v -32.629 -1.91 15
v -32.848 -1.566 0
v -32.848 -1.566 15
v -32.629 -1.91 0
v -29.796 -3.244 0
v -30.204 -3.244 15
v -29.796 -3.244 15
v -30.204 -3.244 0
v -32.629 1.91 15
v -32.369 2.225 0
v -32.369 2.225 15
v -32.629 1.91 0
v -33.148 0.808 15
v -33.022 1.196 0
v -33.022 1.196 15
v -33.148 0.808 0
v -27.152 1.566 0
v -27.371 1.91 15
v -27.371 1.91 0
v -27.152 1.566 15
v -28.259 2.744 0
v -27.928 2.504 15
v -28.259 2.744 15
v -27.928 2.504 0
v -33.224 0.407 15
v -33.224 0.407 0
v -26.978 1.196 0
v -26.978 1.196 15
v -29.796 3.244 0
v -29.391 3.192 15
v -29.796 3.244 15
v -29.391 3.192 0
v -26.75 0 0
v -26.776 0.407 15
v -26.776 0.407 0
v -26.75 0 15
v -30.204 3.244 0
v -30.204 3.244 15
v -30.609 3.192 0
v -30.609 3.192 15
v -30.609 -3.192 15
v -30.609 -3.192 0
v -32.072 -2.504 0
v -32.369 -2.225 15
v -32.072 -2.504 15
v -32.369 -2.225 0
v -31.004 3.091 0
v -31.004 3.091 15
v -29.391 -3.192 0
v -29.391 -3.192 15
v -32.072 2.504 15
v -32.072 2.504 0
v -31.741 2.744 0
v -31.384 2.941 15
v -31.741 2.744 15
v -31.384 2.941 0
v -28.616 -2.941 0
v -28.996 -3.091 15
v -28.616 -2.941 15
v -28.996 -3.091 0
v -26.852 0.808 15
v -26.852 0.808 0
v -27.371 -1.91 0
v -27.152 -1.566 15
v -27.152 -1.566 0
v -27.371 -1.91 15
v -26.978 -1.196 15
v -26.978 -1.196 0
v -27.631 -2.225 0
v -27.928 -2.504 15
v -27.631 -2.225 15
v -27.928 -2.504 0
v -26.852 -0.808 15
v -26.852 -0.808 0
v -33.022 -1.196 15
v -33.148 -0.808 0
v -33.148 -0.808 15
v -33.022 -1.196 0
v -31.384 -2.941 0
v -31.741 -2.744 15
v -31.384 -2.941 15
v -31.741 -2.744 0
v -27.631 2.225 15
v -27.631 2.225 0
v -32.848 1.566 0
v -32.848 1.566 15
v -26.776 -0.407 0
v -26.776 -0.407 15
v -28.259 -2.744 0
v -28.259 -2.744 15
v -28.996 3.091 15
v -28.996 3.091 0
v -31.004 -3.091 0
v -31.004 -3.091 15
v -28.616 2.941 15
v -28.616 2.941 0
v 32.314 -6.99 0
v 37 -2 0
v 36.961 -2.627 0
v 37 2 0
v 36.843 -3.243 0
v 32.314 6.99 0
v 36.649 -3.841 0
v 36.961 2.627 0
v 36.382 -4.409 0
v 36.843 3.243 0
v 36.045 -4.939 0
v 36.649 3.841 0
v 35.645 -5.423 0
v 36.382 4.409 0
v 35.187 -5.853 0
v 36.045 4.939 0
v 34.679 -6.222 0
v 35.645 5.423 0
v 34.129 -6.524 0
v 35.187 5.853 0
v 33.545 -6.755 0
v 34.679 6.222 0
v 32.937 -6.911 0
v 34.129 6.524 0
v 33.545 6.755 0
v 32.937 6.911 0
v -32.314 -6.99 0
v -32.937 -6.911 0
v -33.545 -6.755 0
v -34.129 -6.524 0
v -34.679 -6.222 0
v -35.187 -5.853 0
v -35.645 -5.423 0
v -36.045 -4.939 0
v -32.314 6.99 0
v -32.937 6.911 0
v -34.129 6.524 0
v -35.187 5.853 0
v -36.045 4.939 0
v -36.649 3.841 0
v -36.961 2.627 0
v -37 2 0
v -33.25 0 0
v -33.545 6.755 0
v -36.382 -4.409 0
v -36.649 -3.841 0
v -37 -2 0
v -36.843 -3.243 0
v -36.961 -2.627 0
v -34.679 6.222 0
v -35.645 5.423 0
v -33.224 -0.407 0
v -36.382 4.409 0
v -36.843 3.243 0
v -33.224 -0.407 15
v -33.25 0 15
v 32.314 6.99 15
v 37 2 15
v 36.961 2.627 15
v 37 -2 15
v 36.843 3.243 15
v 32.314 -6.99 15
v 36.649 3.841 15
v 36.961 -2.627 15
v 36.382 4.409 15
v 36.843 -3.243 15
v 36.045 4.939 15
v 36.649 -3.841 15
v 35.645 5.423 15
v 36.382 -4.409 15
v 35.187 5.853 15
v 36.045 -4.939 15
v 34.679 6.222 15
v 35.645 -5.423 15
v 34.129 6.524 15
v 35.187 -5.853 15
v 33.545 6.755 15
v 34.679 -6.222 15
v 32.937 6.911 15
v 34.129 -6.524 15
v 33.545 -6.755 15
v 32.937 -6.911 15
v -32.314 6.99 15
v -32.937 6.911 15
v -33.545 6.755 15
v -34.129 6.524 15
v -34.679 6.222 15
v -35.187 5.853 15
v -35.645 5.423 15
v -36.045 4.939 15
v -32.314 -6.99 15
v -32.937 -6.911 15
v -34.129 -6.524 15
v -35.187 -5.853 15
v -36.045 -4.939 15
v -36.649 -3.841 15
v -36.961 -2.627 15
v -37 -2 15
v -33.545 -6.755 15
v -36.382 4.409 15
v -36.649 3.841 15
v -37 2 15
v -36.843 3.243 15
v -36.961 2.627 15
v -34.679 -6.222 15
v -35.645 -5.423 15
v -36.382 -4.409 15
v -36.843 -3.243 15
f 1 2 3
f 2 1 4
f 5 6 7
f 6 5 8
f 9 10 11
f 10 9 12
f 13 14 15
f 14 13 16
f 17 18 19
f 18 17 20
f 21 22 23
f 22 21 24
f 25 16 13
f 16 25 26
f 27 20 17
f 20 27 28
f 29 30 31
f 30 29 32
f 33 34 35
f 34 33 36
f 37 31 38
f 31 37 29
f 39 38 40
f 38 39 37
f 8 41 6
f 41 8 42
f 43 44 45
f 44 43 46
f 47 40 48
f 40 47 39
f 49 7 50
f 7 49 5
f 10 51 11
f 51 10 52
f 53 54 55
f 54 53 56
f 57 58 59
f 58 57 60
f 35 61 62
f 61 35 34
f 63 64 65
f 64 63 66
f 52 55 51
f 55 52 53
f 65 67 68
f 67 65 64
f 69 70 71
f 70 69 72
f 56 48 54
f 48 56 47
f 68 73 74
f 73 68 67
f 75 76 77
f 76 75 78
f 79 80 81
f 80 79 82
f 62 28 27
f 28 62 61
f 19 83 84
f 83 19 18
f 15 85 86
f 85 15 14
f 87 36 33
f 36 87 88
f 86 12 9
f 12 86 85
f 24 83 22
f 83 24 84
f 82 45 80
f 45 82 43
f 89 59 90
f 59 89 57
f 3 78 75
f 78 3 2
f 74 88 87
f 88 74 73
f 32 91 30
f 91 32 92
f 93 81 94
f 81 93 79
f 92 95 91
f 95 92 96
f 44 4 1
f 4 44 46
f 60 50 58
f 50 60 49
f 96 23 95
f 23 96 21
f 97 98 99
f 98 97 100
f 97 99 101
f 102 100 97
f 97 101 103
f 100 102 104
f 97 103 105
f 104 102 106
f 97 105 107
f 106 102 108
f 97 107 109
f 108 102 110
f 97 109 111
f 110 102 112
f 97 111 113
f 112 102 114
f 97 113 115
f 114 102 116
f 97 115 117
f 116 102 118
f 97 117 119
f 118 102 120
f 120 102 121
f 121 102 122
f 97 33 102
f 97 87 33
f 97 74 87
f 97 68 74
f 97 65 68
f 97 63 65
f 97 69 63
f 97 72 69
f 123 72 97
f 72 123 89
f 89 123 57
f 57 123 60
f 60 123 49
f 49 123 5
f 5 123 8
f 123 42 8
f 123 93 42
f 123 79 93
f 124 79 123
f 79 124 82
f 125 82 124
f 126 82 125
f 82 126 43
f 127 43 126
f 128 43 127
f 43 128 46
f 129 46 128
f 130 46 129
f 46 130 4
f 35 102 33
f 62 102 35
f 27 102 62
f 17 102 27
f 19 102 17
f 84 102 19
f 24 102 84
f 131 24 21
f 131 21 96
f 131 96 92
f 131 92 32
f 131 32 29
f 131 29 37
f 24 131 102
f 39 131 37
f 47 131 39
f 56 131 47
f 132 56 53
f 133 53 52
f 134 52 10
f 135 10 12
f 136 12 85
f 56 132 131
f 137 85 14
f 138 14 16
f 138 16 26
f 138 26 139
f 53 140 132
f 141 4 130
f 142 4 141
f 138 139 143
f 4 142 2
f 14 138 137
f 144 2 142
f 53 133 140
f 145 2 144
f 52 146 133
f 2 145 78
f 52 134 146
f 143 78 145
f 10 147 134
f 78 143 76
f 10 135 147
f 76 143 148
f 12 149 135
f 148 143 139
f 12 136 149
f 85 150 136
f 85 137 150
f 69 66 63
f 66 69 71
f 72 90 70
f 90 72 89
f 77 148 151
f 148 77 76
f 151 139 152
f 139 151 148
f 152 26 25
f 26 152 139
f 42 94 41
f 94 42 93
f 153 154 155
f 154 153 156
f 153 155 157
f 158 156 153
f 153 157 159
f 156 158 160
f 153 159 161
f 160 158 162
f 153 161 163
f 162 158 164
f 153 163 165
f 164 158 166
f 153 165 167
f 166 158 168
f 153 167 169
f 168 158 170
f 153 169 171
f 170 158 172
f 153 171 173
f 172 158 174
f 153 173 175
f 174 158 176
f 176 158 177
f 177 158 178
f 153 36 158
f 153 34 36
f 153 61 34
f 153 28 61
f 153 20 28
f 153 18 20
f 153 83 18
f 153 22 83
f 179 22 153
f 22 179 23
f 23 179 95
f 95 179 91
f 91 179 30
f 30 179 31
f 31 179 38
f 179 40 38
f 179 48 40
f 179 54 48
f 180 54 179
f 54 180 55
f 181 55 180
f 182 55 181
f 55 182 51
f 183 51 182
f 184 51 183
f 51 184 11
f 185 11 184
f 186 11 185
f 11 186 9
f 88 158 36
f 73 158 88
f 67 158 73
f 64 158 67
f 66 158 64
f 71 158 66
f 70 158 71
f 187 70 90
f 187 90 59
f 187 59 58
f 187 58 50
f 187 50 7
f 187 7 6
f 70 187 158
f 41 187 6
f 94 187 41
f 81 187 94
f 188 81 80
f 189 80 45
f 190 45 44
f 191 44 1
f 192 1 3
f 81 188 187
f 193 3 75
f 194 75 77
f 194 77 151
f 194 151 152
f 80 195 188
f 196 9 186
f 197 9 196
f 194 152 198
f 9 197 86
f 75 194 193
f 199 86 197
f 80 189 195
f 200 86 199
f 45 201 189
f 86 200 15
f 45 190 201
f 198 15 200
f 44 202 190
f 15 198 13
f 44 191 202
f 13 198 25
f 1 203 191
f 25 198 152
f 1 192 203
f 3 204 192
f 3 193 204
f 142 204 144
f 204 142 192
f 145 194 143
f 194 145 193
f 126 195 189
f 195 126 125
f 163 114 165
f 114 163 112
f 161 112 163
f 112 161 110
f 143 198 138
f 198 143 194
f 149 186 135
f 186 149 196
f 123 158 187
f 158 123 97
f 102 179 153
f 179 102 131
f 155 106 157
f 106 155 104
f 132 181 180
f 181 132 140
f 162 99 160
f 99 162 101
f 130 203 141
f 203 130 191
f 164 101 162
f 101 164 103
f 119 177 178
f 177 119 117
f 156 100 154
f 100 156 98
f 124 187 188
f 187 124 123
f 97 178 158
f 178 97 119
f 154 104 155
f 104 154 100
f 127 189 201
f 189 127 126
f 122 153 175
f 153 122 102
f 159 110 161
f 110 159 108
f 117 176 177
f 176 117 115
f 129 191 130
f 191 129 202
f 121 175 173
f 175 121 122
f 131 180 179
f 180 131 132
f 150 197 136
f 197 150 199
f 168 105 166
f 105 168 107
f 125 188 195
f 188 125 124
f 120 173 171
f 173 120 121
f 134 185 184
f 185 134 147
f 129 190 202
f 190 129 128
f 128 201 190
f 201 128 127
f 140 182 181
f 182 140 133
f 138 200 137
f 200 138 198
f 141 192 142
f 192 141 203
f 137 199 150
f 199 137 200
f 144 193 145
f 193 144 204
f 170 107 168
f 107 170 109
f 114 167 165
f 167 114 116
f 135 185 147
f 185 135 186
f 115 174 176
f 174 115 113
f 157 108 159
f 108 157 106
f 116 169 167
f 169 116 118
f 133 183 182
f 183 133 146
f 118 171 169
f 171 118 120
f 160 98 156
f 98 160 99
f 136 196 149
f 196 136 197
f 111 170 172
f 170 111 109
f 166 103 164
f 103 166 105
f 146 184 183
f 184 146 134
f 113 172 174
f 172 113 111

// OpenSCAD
$fn = 50;


difference() {
	union() {
		hull() {
			translate(v = [-32.0000000000, 2.0000000000, 0]) {
				cylinder(h = 15, r = 5);
			}
			translate(v = [32.0000000000, 2.0000000000, 0]) {
				cylinder(h = 15, r = 5);
			}
			translate(v = [-32.0000000000, -2.0000000000, 0]) {
				cylinder(h = 15, r = 5);
			}
			translate(v = [32.0000000000, -2.0000000000, 0]) {
				cylinder(h = 15, r = 5);
			}
		}
	}
	union() {
		translate(v = [-30.0000000000, 0.0000000000, 0]) {
			cylinder(h = 15, r = 3.2500000000);
		}
		translate(v = [-30.0000000000, 0.0000000000, 0]) {
			cylinder(h = 15, r = 1.8000000000);
		}
		translate(v = [-30.0000000000, 0.0000000000, 0]) {
			cylinder(h = 15, r = 1.8000000000);
		}
		translate(v = [-30.0000000000, 0.0000000000, 0]) {
			cylinder(h = 15, r = 1.8000000000);
		}
	}
}
